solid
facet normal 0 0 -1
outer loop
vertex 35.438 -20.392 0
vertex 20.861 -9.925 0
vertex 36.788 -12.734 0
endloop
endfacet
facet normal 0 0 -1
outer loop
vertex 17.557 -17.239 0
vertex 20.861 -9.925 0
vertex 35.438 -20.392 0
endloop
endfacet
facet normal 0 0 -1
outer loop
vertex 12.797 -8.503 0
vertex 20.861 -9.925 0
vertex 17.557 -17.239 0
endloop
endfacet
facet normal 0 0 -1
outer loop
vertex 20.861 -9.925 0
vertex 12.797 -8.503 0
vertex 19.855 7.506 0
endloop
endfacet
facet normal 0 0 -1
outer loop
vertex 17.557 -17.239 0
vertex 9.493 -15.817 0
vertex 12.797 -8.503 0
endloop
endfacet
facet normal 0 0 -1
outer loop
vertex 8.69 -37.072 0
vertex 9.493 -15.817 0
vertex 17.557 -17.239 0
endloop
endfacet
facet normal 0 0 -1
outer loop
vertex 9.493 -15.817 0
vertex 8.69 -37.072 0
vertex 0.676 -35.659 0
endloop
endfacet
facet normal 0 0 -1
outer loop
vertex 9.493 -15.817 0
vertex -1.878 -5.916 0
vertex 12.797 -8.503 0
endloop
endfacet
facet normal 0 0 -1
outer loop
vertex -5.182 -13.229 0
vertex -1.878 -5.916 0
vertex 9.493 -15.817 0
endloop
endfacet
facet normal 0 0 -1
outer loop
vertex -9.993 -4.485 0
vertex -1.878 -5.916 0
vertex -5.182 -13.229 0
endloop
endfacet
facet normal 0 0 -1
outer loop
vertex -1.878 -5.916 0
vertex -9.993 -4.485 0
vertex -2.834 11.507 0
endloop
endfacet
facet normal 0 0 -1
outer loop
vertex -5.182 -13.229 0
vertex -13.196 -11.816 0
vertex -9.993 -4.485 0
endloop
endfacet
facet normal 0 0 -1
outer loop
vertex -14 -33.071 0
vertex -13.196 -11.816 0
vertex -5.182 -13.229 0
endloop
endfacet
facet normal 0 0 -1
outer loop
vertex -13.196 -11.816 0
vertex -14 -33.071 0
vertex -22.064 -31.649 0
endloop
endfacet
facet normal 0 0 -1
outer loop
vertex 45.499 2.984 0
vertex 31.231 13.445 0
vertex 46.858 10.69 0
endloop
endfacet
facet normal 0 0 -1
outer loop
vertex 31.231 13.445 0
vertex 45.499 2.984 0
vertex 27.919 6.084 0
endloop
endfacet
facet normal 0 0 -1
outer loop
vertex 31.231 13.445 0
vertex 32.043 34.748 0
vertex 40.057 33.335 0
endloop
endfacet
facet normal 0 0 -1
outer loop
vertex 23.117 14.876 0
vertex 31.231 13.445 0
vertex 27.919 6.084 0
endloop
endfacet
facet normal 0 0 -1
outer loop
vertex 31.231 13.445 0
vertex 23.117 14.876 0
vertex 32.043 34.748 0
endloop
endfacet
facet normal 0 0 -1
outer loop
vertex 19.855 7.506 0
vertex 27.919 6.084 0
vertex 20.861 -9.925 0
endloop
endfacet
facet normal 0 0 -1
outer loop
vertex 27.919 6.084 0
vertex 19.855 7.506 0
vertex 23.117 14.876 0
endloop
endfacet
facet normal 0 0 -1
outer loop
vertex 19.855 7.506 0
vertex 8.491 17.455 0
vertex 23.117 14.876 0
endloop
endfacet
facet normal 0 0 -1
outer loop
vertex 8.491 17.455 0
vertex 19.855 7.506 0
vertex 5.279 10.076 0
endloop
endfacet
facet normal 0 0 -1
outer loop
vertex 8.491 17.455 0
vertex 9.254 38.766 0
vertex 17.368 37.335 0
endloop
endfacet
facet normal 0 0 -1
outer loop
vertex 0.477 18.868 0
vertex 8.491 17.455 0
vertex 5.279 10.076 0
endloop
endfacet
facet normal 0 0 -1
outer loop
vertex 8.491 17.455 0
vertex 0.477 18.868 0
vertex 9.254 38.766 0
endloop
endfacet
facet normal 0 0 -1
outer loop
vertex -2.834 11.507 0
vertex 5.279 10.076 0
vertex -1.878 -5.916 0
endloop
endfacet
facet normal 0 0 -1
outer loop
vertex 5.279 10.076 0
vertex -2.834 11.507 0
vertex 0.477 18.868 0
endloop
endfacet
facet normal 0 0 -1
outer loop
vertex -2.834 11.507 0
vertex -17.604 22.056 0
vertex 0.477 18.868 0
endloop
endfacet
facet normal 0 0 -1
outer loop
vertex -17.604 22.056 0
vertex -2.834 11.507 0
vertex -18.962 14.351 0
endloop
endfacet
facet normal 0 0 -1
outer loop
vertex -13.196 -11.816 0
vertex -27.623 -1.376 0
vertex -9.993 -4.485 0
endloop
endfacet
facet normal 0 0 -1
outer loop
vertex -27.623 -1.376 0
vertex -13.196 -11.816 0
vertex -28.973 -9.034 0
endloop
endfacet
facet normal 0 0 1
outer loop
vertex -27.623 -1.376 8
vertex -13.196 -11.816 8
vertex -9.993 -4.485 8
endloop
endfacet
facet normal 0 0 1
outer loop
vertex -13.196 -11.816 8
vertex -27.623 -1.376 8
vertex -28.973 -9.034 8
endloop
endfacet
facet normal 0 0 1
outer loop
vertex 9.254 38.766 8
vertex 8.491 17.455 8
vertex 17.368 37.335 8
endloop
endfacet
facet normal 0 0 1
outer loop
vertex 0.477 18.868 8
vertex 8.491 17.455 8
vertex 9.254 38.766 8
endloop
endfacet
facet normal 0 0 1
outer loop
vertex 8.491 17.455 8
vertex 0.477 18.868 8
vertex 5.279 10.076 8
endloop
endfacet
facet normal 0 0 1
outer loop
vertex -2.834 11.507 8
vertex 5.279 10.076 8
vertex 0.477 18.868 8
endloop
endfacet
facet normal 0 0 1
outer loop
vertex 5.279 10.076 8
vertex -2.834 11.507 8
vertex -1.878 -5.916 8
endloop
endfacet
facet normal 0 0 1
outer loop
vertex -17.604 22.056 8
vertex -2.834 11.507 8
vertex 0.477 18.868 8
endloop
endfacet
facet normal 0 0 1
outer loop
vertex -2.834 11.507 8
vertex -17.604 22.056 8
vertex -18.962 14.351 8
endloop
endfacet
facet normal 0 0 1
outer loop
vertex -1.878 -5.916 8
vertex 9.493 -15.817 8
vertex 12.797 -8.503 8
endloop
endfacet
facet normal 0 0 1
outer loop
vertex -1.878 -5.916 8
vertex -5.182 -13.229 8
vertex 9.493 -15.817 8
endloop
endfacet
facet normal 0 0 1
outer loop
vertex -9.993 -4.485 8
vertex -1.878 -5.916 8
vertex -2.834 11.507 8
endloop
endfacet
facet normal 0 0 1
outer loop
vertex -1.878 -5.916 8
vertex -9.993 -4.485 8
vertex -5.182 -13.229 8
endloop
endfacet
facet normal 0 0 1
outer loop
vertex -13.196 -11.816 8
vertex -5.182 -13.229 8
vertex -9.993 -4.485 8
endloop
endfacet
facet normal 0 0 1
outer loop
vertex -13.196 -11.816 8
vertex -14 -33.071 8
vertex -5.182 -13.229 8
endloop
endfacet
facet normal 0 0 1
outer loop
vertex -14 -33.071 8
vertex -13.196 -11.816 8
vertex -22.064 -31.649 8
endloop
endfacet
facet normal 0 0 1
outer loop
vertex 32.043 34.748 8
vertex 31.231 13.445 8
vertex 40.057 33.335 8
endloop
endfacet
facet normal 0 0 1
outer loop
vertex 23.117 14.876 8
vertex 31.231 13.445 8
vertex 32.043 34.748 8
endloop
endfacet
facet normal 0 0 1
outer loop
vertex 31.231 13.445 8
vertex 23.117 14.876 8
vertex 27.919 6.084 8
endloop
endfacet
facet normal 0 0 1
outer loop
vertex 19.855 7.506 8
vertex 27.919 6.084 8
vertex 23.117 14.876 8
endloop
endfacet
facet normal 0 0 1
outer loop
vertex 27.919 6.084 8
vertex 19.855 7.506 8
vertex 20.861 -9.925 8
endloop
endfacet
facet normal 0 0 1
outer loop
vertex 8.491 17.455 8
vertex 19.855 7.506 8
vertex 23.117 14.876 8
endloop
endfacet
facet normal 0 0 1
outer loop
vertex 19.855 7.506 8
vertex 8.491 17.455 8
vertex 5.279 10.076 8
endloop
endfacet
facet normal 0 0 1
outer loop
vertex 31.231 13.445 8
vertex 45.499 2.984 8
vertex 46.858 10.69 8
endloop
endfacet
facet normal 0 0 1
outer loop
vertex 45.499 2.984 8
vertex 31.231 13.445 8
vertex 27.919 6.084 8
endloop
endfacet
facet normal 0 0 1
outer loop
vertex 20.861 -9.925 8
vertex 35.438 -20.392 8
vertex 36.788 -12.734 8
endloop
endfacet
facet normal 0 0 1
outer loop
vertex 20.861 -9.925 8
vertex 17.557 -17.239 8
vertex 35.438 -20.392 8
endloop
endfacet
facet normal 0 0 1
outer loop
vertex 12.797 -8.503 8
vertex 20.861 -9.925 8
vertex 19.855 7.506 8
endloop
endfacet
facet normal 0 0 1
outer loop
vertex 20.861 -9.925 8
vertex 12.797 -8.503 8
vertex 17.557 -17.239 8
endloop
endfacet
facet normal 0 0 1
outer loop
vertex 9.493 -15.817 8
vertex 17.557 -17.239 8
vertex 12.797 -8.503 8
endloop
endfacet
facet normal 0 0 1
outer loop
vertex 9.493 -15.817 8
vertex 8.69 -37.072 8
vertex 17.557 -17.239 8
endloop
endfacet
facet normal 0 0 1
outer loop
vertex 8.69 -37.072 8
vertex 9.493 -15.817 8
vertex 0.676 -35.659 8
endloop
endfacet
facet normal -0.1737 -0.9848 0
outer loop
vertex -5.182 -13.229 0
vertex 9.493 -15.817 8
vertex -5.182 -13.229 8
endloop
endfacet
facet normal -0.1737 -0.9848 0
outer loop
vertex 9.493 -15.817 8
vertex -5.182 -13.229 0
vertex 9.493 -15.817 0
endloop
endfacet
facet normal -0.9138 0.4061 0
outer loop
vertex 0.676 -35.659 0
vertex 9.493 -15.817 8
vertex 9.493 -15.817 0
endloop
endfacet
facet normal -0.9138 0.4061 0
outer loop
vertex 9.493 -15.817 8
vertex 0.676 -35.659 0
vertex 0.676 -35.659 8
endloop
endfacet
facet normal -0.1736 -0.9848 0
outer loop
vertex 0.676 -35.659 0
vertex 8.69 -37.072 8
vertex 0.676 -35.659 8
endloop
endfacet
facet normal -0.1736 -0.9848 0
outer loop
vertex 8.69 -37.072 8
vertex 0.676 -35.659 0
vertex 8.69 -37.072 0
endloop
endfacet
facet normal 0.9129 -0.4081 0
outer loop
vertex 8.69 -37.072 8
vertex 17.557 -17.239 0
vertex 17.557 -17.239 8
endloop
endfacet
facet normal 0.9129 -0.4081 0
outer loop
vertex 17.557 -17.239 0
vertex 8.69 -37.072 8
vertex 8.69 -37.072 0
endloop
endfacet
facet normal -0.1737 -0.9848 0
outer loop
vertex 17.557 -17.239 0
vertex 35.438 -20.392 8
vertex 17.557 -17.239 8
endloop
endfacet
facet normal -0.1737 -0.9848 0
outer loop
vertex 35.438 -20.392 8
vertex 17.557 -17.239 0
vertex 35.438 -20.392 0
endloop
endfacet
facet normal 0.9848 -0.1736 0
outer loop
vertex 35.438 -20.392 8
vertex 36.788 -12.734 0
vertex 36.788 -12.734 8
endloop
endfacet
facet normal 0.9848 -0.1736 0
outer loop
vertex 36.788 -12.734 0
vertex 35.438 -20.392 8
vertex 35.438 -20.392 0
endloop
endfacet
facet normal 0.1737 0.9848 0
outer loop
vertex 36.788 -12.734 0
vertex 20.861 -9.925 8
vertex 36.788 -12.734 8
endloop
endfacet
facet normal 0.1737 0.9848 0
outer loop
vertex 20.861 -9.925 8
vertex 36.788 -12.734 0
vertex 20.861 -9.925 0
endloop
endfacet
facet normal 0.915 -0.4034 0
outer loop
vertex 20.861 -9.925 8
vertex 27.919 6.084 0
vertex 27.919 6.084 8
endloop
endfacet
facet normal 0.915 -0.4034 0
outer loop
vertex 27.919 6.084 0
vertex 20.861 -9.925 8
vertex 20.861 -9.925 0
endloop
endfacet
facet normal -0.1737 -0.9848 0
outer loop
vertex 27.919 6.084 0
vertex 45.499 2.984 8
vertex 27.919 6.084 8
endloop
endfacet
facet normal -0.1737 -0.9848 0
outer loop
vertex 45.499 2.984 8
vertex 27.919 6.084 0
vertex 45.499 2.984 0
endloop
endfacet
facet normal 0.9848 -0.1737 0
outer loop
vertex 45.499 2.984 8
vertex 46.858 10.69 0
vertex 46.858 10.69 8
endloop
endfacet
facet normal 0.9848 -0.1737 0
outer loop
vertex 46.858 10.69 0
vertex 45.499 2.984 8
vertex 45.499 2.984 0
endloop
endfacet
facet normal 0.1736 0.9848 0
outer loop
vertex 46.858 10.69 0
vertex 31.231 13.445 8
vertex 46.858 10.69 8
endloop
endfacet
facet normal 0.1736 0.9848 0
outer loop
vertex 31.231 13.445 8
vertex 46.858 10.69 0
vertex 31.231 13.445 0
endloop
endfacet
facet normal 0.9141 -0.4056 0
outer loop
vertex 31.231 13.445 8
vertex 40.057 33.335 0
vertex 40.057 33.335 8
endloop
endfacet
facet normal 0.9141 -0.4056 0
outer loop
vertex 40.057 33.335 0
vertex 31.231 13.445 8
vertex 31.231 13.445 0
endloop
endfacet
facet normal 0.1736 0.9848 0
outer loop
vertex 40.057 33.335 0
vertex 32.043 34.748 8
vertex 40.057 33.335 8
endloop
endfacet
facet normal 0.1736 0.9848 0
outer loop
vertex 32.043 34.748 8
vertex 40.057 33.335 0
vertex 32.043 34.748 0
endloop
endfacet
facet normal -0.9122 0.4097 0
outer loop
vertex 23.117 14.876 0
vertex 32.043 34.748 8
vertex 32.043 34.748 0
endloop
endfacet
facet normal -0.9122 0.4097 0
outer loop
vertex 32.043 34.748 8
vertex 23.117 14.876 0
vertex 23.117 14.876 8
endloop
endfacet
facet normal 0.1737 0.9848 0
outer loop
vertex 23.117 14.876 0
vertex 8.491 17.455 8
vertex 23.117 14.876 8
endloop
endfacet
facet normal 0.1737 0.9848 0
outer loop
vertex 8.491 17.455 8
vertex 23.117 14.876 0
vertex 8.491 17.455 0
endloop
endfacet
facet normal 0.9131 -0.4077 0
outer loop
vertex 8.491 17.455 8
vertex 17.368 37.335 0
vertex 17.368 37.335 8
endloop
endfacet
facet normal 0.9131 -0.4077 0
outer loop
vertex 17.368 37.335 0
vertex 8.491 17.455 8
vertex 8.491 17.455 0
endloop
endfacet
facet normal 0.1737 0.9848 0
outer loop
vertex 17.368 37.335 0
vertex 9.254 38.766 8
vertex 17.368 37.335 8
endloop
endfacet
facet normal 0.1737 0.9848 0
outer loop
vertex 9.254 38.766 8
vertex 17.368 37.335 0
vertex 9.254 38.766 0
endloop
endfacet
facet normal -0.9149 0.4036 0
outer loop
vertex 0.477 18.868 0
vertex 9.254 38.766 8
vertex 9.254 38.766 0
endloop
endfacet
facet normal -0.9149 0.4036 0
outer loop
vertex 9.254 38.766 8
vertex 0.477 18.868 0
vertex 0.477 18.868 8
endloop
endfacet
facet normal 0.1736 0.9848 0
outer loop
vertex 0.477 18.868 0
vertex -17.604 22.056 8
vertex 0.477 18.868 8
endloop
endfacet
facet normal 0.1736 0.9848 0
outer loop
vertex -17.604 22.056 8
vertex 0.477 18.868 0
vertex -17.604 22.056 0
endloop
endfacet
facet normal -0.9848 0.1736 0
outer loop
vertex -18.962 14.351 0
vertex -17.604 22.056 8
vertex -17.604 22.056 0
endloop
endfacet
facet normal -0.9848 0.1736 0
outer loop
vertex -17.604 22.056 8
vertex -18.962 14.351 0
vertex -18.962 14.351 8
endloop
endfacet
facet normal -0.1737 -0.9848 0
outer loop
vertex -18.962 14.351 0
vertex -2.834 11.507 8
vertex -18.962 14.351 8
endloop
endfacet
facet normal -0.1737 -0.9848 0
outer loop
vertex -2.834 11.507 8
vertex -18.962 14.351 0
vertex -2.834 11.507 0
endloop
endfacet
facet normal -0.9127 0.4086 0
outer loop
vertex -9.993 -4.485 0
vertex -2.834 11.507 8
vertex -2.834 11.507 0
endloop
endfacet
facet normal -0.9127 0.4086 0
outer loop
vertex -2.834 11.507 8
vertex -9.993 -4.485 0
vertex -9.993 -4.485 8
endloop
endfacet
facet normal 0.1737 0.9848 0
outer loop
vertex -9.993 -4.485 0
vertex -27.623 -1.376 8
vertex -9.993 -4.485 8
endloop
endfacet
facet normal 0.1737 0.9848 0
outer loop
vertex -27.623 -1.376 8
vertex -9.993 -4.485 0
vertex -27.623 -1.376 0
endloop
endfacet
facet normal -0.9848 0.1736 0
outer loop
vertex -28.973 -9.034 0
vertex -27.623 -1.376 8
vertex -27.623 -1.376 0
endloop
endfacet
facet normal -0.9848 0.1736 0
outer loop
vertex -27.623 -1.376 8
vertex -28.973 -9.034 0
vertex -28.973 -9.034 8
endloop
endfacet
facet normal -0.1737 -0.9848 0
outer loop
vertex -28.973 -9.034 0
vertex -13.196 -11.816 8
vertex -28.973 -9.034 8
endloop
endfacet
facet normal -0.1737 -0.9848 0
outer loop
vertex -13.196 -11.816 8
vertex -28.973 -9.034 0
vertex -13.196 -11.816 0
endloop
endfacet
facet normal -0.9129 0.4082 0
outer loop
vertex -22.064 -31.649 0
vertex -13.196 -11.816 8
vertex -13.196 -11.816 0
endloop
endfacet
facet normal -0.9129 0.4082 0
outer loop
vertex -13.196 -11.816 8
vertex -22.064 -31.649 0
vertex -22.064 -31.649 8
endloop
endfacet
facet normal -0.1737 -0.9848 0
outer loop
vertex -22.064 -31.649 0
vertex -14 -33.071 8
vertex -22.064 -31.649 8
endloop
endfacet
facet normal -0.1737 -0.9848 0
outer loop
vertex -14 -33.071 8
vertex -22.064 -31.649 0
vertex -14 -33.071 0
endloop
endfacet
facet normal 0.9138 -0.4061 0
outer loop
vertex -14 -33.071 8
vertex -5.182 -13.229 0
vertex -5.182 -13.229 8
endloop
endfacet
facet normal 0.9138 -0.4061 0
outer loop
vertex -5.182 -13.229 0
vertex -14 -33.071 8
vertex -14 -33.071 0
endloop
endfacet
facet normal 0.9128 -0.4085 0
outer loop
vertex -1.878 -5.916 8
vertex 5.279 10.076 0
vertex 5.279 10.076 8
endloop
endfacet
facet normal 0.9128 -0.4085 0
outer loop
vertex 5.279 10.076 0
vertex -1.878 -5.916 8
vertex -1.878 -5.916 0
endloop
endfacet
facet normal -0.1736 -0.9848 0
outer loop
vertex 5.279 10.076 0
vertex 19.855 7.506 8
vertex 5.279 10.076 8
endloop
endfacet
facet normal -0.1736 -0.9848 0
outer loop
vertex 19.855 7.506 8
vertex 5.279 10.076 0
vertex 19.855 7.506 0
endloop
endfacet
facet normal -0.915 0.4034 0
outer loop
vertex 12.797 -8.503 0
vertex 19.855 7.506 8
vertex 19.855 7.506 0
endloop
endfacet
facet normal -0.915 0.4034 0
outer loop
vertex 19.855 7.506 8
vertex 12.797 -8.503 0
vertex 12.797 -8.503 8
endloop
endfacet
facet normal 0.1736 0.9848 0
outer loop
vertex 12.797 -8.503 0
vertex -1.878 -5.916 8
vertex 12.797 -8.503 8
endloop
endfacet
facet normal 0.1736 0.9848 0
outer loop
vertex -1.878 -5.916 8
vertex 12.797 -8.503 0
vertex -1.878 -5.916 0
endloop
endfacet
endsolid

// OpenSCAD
// Street Numbers for 3D printing
// Charles Tilford, 2019
// License: CC BY-NC-SA 4.0
//   https://creativecommons.org/licenses/by-nc-sa/4.0/

char="#";     // The number/letter to print

// Units are in mm, except for height of letter

// How many inches high should letter be?
inchesHigh=3;
// How thick/deep should letter be (mm)?
depth=8;

// Character coordinates just center the letter
charX=-35;    // Character X coord
charY=-35;    // Character Y coord
topScrew=33;  // Top screw Y coord
botScrew=-28; // Bottom screw Y coord
height=8;     // Thickness of character
// Screw dimensions. Default presumes
// #6 sheet metal screw
screwWid=3.6; // Width of screw shaft
screwTop=6.78;// Width of screw head
screwCon=5.08;// Height of head 'cone'

// Font to print in. Your system needs this
// installed, of course. If changed the hole
// positions almost certainly need to be
// changed, and maybe charX/charY.
fName="Open Sans Extrabold";
// https://fonts.google.com/specimen/Open+Sans
// Designer: Steve Matteson

// Thin floor below holes. My printer was
// struggling to have the hole 'border' stick
// to the stage. Just drill/screw thru it.
holeFloor=0.1; 

// ==========================================
// ===== All values below are auto-calculated
// ==========================================

// Scaled values
scaleFactor=inchesHigh / 3;
cX=charX * scaleFactor;
cY=charY * scaleFactor;
tS=topScrew * scaleFactor;
bS=botScrew * scaleFactor;
// Where do we start drawing screw head cone?
oS=depth - (screwCon-.05);

difference() {
  // We use difference() to punch out the screw holes
  // in the character
    
  // The character itself, 8mm thick
  rotate(a=-10)
  translate([cX,cY,0])
    linear_extrude(height=depth, scale=1)
    text(char, size=(75*scaleFactor),
         $fn=100, font=fName);
    
  // Bottom screw hole
  translate([0,bS,oS]) color("red")
    cylinder(h=screwCon, d2=screwTop,
             d1=0, $fn=20);
   translate([0,bS,holeFloor])
    cylinder(h=20, d=screwWid, $fn=20);
    
  // Top screw hole
  translate([0,tS,oS]) color("red")
    cylinder(h=screwCon, d2=screwTop,
             d1=0, $fn=20);
  translate([0,tS,holeFloor])
    cylinder(h=20, d=screwWid, $fn=20);
}

// Colors are just to aid visualization of
// void spaces. $fn is "featuer number", ie how
// many polygons are devoted to object. The values
// above should be near your printing limit anyway.

// Developed in OpenSCAD
//    https://www.openscad.org/
